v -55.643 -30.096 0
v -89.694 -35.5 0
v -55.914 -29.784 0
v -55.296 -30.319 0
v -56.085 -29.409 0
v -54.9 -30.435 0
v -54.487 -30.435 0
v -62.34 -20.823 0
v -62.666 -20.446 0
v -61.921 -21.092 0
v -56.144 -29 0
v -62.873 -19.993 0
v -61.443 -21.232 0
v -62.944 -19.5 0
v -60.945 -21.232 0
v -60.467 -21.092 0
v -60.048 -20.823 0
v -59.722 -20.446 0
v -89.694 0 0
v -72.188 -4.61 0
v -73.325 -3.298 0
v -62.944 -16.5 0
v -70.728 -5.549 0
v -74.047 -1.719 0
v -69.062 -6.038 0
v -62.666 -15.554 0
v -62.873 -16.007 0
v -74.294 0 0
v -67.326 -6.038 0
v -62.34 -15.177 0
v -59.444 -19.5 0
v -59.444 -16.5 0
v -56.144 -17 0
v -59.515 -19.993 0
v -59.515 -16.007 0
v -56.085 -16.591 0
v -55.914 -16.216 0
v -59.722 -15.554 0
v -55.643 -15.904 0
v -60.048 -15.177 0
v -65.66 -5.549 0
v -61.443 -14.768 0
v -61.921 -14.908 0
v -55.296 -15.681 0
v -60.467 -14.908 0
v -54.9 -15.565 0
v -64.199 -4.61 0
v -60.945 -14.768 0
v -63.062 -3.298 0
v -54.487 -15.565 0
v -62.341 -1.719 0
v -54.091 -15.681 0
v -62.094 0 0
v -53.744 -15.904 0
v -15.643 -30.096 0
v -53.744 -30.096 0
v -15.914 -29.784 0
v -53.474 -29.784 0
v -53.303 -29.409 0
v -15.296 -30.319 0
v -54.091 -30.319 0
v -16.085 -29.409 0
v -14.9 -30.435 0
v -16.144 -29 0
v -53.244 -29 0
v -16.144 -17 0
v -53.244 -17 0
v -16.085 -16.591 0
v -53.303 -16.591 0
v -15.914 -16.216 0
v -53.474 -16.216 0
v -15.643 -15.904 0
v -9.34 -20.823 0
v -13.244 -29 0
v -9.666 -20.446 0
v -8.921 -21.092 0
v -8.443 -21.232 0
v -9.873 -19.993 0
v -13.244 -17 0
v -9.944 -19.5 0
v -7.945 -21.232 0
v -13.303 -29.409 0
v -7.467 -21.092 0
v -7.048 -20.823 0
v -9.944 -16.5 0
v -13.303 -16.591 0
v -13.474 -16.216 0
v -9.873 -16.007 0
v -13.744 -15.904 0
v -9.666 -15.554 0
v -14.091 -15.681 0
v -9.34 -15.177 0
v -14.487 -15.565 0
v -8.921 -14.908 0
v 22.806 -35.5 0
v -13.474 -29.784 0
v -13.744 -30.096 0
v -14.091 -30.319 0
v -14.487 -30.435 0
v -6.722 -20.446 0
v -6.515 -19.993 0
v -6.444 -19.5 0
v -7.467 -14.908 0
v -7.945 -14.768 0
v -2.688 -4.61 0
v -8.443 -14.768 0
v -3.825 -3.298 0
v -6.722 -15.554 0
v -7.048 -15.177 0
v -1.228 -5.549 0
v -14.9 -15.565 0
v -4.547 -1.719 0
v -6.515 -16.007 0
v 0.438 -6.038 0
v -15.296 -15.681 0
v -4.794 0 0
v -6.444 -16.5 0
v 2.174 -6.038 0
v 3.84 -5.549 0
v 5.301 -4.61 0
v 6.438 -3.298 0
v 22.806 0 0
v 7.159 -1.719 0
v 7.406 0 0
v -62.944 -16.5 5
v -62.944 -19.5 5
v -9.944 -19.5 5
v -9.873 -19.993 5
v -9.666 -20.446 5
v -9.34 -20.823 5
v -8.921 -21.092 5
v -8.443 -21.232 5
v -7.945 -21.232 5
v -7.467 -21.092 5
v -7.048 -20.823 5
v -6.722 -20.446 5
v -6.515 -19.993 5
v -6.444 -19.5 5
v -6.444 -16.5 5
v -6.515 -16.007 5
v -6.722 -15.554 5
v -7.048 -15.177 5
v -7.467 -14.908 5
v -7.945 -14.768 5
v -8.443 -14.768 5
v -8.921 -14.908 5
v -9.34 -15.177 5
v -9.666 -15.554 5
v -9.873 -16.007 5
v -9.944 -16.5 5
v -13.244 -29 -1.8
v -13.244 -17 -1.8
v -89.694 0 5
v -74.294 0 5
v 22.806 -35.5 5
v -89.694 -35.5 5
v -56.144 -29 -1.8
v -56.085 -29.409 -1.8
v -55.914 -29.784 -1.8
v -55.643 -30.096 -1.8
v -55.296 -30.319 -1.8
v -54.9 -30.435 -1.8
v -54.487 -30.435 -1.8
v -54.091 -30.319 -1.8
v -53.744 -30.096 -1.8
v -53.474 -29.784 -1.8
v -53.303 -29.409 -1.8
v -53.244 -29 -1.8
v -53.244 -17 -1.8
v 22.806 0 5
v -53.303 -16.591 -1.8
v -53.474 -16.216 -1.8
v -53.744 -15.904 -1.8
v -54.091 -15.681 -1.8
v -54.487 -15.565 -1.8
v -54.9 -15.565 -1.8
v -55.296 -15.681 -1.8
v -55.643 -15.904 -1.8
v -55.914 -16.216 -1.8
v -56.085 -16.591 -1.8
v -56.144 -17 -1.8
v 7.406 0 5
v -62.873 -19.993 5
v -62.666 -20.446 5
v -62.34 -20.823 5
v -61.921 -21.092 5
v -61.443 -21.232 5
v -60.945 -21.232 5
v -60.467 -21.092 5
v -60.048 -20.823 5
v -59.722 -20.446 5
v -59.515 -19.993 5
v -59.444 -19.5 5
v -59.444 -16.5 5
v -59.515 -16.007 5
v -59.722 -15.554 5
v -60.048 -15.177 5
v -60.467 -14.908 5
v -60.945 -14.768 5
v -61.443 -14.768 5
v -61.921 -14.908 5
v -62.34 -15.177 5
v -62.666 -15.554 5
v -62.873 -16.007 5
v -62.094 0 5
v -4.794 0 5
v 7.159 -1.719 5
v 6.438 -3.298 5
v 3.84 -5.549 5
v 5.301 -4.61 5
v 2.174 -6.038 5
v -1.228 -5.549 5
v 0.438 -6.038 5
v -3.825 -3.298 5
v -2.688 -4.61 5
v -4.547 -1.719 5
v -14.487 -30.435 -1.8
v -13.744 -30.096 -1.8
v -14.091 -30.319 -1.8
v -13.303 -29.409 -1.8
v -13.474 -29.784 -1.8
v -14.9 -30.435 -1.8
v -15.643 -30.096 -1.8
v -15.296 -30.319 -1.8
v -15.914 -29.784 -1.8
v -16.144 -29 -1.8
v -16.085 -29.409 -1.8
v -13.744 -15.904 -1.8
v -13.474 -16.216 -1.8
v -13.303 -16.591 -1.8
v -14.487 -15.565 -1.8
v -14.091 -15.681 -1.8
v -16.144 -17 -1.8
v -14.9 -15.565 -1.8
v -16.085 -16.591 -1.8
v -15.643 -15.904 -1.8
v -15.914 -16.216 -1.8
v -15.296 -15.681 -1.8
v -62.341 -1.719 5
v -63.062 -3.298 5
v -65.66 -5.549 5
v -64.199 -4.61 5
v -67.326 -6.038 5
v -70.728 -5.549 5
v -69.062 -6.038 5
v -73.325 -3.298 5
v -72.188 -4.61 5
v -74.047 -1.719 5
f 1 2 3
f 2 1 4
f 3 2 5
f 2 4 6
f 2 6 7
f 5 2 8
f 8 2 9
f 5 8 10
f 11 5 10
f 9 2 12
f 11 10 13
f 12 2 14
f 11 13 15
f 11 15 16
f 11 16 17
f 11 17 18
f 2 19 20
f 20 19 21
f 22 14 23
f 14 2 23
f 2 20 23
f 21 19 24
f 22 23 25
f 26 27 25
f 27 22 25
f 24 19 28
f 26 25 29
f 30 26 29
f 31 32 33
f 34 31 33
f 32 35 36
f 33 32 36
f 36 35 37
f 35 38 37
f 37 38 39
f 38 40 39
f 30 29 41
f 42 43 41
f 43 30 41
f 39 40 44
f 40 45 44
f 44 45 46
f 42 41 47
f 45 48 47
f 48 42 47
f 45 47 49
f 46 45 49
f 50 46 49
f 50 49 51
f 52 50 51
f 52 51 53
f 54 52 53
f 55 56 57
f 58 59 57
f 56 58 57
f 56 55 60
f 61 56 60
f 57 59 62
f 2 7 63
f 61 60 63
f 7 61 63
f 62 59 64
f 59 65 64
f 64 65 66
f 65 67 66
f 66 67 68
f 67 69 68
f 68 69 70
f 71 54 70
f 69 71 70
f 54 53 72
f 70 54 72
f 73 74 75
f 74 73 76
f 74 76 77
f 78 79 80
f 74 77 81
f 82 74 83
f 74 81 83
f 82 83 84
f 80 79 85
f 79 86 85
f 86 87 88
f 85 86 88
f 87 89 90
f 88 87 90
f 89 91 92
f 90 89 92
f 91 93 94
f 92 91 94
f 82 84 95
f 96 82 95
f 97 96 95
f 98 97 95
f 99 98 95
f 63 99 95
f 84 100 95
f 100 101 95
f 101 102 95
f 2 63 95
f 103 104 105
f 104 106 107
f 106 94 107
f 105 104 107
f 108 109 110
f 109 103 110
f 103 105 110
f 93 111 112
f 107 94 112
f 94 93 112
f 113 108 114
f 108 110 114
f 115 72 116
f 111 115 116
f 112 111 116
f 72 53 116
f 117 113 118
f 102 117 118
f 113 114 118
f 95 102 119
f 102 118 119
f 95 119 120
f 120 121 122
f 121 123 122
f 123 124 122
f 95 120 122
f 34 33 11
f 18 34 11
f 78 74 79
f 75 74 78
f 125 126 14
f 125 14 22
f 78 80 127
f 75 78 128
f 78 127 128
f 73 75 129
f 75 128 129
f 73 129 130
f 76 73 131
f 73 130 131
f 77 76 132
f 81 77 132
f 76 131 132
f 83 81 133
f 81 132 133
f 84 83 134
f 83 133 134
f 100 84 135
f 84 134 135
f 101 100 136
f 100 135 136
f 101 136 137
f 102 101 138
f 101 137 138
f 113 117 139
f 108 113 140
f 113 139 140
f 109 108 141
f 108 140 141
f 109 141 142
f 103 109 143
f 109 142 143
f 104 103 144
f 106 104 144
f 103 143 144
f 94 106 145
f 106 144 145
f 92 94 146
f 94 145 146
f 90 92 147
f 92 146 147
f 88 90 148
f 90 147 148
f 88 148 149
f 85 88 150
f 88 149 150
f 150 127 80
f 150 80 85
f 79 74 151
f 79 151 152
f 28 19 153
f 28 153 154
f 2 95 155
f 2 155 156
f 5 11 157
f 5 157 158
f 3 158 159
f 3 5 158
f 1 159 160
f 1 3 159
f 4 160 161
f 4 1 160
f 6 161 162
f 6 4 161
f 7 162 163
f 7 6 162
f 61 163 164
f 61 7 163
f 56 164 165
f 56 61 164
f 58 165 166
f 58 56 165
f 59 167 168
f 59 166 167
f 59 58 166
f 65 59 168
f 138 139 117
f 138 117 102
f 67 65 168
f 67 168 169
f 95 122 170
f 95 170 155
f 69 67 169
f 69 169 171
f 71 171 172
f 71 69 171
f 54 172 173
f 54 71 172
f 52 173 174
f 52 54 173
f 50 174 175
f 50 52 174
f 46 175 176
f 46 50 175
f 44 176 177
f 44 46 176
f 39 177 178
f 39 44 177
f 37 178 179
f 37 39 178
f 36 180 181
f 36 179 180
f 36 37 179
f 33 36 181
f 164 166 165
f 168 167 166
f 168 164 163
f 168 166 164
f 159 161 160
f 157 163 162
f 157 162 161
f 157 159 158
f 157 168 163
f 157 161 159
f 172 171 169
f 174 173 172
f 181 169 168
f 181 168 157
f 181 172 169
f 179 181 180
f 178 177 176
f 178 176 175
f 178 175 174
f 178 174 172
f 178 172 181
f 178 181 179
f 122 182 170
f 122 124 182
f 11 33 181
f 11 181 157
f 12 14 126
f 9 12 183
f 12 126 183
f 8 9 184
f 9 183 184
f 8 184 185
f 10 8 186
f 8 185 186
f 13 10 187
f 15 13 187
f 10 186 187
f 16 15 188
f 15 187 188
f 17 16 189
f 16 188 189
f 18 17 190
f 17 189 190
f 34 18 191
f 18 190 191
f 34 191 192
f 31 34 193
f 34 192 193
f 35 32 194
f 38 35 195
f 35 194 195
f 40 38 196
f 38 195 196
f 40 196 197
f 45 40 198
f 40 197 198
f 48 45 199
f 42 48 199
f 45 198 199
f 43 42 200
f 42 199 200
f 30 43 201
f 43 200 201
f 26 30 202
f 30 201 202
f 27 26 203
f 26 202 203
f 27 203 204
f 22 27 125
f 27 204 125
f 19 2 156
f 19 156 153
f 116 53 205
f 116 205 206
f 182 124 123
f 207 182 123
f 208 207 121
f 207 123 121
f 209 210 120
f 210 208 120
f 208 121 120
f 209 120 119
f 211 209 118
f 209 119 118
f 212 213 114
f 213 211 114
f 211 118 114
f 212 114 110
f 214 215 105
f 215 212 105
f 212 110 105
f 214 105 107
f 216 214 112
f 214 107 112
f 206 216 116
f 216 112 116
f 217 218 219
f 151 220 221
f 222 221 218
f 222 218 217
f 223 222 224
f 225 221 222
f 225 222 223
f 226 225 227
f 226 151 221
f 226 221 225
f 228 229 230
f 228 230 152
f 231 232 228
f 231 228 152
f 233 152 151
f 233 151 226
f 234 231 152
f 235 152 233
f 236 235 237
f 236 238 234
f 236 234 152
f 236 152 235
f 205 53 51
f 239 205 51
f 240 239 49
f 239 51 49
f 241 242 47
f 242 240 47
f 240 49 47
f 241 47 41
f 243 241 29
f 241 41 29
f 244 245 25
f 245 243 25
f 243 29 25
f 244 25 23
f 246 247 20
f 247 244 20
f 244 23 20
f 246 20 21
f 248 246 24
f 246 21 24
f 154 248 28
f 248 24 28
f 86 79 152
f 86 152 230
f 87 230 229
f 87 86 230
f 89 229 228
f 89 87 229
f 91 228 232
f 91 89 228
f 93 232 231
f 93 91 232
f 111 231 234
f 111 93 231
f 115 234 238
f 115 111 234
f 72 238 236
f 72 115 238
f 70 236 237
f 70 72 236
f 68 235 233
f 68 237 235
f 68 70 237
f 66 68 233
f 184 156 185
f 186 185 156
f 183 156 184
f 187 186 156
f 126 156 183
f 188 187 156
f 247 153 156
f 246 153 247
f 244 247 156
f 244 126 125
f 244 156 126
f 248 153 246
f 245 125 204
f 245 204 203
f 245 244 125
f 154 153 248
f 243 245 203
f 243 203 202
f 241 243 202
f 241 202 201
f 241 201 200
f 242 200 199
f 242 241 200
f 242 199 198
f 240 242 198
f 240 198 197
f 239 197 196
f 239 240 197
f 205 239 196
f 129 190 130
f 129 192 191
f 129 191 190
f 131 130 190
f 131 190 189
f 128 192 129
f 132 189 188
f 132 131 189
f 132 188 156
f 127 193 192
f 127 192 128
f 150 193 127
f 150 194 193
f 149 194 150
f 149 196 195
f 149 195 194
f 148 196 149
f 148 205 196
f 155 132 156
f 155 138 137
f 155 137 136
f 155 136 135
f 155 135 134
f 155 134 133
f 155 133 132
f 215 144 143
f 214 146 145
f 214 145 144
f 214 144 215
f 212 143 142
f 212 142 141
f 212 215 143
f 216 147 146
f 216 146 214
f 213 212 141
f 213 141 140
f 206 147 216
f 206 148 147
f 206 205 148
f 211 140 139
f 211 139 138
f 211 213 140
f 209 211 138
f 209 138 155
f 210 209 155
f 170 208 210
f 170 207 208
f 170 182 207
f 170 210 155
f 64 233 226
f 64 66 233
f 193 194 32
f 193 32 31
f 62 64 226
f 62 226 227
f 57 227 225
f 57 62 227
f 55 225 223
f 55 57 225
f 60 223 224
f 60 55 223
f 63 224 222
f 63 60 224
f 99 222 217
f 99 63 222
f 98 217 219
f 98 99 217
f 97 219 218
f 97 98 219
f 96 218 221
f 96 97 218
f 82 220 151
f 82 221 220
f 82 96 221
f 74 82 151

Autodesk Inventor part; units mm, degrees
ref_plane "YZ Plane" through (0, 0, 0) normal (1, 0, 0) x (0, 1, 0)
ref_plane "XZ Plane" through (0, 0, 0) normal (0, 1, 0) x (-1, 0, 0)
ref_plane "XY Plane" through (0, 0, 0) normal (0, 0, 1) x (1, 0, 0)
ref_plane "Work Plane1" through (0, 0, 0) normal (0, 0, 1) x (1, 0, 0)
sketch "Sketch1" plane through (0, 0, 0) normal (0, 0, 1) x (1, 0, 0)
  line L0 (22.8064, -35.5) -> (-89.6938, -35.5)
  line L1 (-89.6938, -35.5) -> (-89.6938, 0)
  line L2 (-89.6938, 0) -> (-74.2938, 0)
  line L3 (22.8064, 0) -> (22.8064, -35.5)
  circle A0 centre (11.5562, -18) radius 2 construction
  line L4 (-53.1938, -16) -> (-53.1938, -30) construction
  arc A1 (-56.1938, -30) -> (-53.1938, -30) centre (-54.6938, -30) ccw construction
  line L5 (-56.1938, -30) -> (-56.1938, -16) construction
  arc A2 (-53.1938, -16) -> (-56.1938, -16) centre (-54.6938, -16) ccw construction
  line L6 (7.0562, -16) -> (7.0562, -30) construction
  arc A3 (4.0562, -30) -> (7.0562, -30) centre (5.5562, -30) ccw construction
  line L7 (4.0562, -30) -> (4.0562, -16) construction
  arc A4 (7.0562, -16) -> (4.0562, -16) centre (5.5562, -16) ccw construction
  line L8 (-13.1938, -16) -> (-13.1938, -30) construction
  arc A5 (-16.1938, -30) -> (-13.1938, -30) centre (-14.6938, -30) ccw construction
  line L9 (-16.1938, -30) -> (-16.1938, -16) construction
  arc A6 (-13.1938, -16) -> (-16.1938, -16) centre (-14.6938, -16) ccw construction
  arc A7 (19.0562, -16) -> (16.0562, -16) centre (17.5562, -16) ccw construction
  line L10 (19.0562, -16) -> (19.0562, -30) construction
  arc A8 (16.0562, -30) -> (19.0562, -30) centre (17.5562, -30) ccw construction
  line L11 (16.0562, -30) -> (16.0562, -16) construction
  line L12 (22.8064, -40) -> (22.8064, 45) construction
  line L13 (22.8064, 45) -> (-120, 45) construction
  line L14 (-120, 27.5563) -> (-120, 45) construction
  line L15 (-120, 27.5563) -> (-95.2035, 27.5563) construction
  arc A9 (-85.0841, 27.5563) -> (-95.2035, 27.5563) centre (-90.1438, 25.4) ccw construction
  line L16 (-85.0841, 27.5563) -> (17.8062, 27.5563) construction
  line L17 (17.8062, 27.5563) -> (17.8062, -11) construction
  line L18 (17.8062, -11) -> (-120, -11) construction
  line L19 (-120, -40) -> (-120, -11) construction
  line L20 (22.8064, -40) -> (-120, -40) construction
  circle A10 centre (-111.1938, -18) radius 2 construction
  circle A11 centre (-98.1938, -18) radius 2 construction
  circle A12 centre (-61.1938, -18) radius 2 construction
  circle A13 centre (-48.1938, -18) radius 2 construction
  circle A14 centre (-21.1938, -18) radius 2 construction
  circle A15 centre (-8.1938, -18) radius 2 construction
  circle A16 centre (-21.1938, 33.6563) radius 2 construction
  circle A17 centre (-8.1938, 33.6563) radius 2 construction
  circle A18 centre (-61.1938, 33.6563) radius 2 construction
  circle A19 centre (-48.1938, 33.6563) radius 2 construction
  circle A20 centre (-111.1938, 33.6563) radius 2 construction
  circle A21 centre (-98.1938, 33.6563) radius 2 construction
  circle A22 centre (-90.1438, -25.4) radius 5.5 construction
  line L21 (-84.6938, 26.6563) -> (-89.6938, 26.6563) construction
  line L22 (-89.6938, 26.6563) -> (-89.6938, -11) construction
  line L23 (-84.6938, -11) -> (-89.6938, -11) construction
  line L24 (-84.6938, 26.6563) -> (-84.6938, -11) construction
  line L25 (-84.6938, 26.6563) -> (-84.6938, -11) construction
  circle A23 centre (1.3062, 0) radius 6 construction
  circle A24 centre (-68.1938, 0) radius 6 construction
  arc A25 (-4.7938, 0) -> (7.4062, 0) centre (1.3062, 0) ccw
  arc A26 (-74.2938, 0) -> (-62.0938, 0) centre (-68.1938, 0) ccw
  line L26 (-148.5613, 0) -> (51.3677, 0) construction
  line L27 (7.4062, 0) -> (22.8064, 0)
  line L28 (-62.0938, 0) -> (-4.7938, 0)
  point P0 (0, 0)
  point P1 (17.5562, -31.5)
  dimension "d0" = 0
  dimension "d1" = 0
  dimension "d2" = 4
  dimension "d3" = 0.1
  dimension "d4" = 0.1
extrude "Main Body" add sketch "Sketch1" along normal blind 5
sketch "Sketch2" plane through (0, 0, 0) normal (0, 0, -1) x (-1, 0, 0)
  line L0 (56.1938, -30) -> (56.1938, -16) construction
  arc A0 (53.1938, -30) -> (56.1938, -30) centre (54.6938, -30) ccw construction
  line L1 (53.1938, -16) -> (53.1938, -30) construction
  arc A1 (56.1938, -16) -> (53.1938, -16) centre (54.6938, -16) ccw construction
  arc A2 (13.1938, -30) -> (16.1938, -30) centre (14.6938, -30) ccw construction
  line L2 (13.1938, -16) -> (13.1938, -30) construction
  arc A3 (16.1938, -16) -> (13.1938, -16) centre (14.6938, -16) ccw construction
  line L3 (16.1938, -30) -> (16.1938, -16) construction
  line L4 (14.6938, -16) -> (14.6938, -30) construction
  line L5 (54.6938, -16) -> (54.6938, -30) construction
  line L6 (14.6938, -29) -> (14.6938, -17) construction
  line L7 (13.2438, -29) -> (13.2438, -17)
  line L8 (16.1438, -17) -> (16.1438, -29)
  arc A4 (13.2438, -29) -> (16.1438, -29) centre (14.6938, -29) ccw
  arc A5 (16.1438, -17) -> (13.2438, -17) centre (14.6938, -17) ccw
  line L9 (54.6938, -29) -> (54.6938, -17) construction
  line L10 (53.2438, -29) -> (53.2438, -17)
  line L11 (56.1438, -17) -> (56.1438, -29)
  arc A6 (53.2438, -29) -> (56.1438, -29) centre (54.6938, -29) ccw
  arc A7 (56.1438, -17) -> (53.2438, -17) centre (54.6938, -17) ccw
  line L12 (14.6938, -17) -> (54.6938, -17) construction
  point P0 (0, 0)
  point P1 (14.6938, -23)
  point P2 (54.6938, -23)
  dimension "d7" = 0.05
  dimension "d8" = 0.05
  dimension "d9" = 1
extrude "Alignment Tabs" add sketch "Sketch2" along normal blind 1.8
sketch "Sketch3" plane through (0, 0, 5) normal (0, 0, -1) x (-1, 0, 0)
  circle A0 centre (61.1938, -18) radius 2 construction
  circle A1 centre (8.1938, -18) radius 2 construction
  line L0 (61.1938, -16.5) -> (61.1938, -19.5) construction
  line L1 (59.4438, -16.5) -> (59.4438, -19.5)
  line L2 (62.9438, -19.5) -> (62.9438, -16.5)
  arc A2 (62.9438, -16.5) -> (59.4438, -16.5) centre (61.1938, -16.5) ccw
  arc A3 (59.4438, -19.5) -> (62.9438, -19.5) centre (61.1938, -19.5) ccw
  line L3 (8.1938, -16.5) -> (8.1938, -19.5) construction
  line L4 (6.4438, -16.5) -> (6.4438, -19.5)
  line L5 (9.9438, -19.5) -> (9.9438, -16.5)
  arc A4 (9.9438, -16.5) -> (6.4438, -16.5) centre (8.1938, -16.5) ccw
  arc A5 (6.4438, -19.5) -> (9.9438, -19.5) centre (8.1938, -19.5) ccw
  point P0 (0, 0)
  dimension "d12" = 3.5
  dimension "d13" = 3.5
  dimension "d14" = 3
  dimension "d15" = 3
extrude "Slots for Screws M3" cut sketch "Sketch3" along normal through all
equation "\"d4\" = d3"
equation "\"d8\" = d7"
equation "\"d13\" = d12"
equation "\"d15\" = d14"
